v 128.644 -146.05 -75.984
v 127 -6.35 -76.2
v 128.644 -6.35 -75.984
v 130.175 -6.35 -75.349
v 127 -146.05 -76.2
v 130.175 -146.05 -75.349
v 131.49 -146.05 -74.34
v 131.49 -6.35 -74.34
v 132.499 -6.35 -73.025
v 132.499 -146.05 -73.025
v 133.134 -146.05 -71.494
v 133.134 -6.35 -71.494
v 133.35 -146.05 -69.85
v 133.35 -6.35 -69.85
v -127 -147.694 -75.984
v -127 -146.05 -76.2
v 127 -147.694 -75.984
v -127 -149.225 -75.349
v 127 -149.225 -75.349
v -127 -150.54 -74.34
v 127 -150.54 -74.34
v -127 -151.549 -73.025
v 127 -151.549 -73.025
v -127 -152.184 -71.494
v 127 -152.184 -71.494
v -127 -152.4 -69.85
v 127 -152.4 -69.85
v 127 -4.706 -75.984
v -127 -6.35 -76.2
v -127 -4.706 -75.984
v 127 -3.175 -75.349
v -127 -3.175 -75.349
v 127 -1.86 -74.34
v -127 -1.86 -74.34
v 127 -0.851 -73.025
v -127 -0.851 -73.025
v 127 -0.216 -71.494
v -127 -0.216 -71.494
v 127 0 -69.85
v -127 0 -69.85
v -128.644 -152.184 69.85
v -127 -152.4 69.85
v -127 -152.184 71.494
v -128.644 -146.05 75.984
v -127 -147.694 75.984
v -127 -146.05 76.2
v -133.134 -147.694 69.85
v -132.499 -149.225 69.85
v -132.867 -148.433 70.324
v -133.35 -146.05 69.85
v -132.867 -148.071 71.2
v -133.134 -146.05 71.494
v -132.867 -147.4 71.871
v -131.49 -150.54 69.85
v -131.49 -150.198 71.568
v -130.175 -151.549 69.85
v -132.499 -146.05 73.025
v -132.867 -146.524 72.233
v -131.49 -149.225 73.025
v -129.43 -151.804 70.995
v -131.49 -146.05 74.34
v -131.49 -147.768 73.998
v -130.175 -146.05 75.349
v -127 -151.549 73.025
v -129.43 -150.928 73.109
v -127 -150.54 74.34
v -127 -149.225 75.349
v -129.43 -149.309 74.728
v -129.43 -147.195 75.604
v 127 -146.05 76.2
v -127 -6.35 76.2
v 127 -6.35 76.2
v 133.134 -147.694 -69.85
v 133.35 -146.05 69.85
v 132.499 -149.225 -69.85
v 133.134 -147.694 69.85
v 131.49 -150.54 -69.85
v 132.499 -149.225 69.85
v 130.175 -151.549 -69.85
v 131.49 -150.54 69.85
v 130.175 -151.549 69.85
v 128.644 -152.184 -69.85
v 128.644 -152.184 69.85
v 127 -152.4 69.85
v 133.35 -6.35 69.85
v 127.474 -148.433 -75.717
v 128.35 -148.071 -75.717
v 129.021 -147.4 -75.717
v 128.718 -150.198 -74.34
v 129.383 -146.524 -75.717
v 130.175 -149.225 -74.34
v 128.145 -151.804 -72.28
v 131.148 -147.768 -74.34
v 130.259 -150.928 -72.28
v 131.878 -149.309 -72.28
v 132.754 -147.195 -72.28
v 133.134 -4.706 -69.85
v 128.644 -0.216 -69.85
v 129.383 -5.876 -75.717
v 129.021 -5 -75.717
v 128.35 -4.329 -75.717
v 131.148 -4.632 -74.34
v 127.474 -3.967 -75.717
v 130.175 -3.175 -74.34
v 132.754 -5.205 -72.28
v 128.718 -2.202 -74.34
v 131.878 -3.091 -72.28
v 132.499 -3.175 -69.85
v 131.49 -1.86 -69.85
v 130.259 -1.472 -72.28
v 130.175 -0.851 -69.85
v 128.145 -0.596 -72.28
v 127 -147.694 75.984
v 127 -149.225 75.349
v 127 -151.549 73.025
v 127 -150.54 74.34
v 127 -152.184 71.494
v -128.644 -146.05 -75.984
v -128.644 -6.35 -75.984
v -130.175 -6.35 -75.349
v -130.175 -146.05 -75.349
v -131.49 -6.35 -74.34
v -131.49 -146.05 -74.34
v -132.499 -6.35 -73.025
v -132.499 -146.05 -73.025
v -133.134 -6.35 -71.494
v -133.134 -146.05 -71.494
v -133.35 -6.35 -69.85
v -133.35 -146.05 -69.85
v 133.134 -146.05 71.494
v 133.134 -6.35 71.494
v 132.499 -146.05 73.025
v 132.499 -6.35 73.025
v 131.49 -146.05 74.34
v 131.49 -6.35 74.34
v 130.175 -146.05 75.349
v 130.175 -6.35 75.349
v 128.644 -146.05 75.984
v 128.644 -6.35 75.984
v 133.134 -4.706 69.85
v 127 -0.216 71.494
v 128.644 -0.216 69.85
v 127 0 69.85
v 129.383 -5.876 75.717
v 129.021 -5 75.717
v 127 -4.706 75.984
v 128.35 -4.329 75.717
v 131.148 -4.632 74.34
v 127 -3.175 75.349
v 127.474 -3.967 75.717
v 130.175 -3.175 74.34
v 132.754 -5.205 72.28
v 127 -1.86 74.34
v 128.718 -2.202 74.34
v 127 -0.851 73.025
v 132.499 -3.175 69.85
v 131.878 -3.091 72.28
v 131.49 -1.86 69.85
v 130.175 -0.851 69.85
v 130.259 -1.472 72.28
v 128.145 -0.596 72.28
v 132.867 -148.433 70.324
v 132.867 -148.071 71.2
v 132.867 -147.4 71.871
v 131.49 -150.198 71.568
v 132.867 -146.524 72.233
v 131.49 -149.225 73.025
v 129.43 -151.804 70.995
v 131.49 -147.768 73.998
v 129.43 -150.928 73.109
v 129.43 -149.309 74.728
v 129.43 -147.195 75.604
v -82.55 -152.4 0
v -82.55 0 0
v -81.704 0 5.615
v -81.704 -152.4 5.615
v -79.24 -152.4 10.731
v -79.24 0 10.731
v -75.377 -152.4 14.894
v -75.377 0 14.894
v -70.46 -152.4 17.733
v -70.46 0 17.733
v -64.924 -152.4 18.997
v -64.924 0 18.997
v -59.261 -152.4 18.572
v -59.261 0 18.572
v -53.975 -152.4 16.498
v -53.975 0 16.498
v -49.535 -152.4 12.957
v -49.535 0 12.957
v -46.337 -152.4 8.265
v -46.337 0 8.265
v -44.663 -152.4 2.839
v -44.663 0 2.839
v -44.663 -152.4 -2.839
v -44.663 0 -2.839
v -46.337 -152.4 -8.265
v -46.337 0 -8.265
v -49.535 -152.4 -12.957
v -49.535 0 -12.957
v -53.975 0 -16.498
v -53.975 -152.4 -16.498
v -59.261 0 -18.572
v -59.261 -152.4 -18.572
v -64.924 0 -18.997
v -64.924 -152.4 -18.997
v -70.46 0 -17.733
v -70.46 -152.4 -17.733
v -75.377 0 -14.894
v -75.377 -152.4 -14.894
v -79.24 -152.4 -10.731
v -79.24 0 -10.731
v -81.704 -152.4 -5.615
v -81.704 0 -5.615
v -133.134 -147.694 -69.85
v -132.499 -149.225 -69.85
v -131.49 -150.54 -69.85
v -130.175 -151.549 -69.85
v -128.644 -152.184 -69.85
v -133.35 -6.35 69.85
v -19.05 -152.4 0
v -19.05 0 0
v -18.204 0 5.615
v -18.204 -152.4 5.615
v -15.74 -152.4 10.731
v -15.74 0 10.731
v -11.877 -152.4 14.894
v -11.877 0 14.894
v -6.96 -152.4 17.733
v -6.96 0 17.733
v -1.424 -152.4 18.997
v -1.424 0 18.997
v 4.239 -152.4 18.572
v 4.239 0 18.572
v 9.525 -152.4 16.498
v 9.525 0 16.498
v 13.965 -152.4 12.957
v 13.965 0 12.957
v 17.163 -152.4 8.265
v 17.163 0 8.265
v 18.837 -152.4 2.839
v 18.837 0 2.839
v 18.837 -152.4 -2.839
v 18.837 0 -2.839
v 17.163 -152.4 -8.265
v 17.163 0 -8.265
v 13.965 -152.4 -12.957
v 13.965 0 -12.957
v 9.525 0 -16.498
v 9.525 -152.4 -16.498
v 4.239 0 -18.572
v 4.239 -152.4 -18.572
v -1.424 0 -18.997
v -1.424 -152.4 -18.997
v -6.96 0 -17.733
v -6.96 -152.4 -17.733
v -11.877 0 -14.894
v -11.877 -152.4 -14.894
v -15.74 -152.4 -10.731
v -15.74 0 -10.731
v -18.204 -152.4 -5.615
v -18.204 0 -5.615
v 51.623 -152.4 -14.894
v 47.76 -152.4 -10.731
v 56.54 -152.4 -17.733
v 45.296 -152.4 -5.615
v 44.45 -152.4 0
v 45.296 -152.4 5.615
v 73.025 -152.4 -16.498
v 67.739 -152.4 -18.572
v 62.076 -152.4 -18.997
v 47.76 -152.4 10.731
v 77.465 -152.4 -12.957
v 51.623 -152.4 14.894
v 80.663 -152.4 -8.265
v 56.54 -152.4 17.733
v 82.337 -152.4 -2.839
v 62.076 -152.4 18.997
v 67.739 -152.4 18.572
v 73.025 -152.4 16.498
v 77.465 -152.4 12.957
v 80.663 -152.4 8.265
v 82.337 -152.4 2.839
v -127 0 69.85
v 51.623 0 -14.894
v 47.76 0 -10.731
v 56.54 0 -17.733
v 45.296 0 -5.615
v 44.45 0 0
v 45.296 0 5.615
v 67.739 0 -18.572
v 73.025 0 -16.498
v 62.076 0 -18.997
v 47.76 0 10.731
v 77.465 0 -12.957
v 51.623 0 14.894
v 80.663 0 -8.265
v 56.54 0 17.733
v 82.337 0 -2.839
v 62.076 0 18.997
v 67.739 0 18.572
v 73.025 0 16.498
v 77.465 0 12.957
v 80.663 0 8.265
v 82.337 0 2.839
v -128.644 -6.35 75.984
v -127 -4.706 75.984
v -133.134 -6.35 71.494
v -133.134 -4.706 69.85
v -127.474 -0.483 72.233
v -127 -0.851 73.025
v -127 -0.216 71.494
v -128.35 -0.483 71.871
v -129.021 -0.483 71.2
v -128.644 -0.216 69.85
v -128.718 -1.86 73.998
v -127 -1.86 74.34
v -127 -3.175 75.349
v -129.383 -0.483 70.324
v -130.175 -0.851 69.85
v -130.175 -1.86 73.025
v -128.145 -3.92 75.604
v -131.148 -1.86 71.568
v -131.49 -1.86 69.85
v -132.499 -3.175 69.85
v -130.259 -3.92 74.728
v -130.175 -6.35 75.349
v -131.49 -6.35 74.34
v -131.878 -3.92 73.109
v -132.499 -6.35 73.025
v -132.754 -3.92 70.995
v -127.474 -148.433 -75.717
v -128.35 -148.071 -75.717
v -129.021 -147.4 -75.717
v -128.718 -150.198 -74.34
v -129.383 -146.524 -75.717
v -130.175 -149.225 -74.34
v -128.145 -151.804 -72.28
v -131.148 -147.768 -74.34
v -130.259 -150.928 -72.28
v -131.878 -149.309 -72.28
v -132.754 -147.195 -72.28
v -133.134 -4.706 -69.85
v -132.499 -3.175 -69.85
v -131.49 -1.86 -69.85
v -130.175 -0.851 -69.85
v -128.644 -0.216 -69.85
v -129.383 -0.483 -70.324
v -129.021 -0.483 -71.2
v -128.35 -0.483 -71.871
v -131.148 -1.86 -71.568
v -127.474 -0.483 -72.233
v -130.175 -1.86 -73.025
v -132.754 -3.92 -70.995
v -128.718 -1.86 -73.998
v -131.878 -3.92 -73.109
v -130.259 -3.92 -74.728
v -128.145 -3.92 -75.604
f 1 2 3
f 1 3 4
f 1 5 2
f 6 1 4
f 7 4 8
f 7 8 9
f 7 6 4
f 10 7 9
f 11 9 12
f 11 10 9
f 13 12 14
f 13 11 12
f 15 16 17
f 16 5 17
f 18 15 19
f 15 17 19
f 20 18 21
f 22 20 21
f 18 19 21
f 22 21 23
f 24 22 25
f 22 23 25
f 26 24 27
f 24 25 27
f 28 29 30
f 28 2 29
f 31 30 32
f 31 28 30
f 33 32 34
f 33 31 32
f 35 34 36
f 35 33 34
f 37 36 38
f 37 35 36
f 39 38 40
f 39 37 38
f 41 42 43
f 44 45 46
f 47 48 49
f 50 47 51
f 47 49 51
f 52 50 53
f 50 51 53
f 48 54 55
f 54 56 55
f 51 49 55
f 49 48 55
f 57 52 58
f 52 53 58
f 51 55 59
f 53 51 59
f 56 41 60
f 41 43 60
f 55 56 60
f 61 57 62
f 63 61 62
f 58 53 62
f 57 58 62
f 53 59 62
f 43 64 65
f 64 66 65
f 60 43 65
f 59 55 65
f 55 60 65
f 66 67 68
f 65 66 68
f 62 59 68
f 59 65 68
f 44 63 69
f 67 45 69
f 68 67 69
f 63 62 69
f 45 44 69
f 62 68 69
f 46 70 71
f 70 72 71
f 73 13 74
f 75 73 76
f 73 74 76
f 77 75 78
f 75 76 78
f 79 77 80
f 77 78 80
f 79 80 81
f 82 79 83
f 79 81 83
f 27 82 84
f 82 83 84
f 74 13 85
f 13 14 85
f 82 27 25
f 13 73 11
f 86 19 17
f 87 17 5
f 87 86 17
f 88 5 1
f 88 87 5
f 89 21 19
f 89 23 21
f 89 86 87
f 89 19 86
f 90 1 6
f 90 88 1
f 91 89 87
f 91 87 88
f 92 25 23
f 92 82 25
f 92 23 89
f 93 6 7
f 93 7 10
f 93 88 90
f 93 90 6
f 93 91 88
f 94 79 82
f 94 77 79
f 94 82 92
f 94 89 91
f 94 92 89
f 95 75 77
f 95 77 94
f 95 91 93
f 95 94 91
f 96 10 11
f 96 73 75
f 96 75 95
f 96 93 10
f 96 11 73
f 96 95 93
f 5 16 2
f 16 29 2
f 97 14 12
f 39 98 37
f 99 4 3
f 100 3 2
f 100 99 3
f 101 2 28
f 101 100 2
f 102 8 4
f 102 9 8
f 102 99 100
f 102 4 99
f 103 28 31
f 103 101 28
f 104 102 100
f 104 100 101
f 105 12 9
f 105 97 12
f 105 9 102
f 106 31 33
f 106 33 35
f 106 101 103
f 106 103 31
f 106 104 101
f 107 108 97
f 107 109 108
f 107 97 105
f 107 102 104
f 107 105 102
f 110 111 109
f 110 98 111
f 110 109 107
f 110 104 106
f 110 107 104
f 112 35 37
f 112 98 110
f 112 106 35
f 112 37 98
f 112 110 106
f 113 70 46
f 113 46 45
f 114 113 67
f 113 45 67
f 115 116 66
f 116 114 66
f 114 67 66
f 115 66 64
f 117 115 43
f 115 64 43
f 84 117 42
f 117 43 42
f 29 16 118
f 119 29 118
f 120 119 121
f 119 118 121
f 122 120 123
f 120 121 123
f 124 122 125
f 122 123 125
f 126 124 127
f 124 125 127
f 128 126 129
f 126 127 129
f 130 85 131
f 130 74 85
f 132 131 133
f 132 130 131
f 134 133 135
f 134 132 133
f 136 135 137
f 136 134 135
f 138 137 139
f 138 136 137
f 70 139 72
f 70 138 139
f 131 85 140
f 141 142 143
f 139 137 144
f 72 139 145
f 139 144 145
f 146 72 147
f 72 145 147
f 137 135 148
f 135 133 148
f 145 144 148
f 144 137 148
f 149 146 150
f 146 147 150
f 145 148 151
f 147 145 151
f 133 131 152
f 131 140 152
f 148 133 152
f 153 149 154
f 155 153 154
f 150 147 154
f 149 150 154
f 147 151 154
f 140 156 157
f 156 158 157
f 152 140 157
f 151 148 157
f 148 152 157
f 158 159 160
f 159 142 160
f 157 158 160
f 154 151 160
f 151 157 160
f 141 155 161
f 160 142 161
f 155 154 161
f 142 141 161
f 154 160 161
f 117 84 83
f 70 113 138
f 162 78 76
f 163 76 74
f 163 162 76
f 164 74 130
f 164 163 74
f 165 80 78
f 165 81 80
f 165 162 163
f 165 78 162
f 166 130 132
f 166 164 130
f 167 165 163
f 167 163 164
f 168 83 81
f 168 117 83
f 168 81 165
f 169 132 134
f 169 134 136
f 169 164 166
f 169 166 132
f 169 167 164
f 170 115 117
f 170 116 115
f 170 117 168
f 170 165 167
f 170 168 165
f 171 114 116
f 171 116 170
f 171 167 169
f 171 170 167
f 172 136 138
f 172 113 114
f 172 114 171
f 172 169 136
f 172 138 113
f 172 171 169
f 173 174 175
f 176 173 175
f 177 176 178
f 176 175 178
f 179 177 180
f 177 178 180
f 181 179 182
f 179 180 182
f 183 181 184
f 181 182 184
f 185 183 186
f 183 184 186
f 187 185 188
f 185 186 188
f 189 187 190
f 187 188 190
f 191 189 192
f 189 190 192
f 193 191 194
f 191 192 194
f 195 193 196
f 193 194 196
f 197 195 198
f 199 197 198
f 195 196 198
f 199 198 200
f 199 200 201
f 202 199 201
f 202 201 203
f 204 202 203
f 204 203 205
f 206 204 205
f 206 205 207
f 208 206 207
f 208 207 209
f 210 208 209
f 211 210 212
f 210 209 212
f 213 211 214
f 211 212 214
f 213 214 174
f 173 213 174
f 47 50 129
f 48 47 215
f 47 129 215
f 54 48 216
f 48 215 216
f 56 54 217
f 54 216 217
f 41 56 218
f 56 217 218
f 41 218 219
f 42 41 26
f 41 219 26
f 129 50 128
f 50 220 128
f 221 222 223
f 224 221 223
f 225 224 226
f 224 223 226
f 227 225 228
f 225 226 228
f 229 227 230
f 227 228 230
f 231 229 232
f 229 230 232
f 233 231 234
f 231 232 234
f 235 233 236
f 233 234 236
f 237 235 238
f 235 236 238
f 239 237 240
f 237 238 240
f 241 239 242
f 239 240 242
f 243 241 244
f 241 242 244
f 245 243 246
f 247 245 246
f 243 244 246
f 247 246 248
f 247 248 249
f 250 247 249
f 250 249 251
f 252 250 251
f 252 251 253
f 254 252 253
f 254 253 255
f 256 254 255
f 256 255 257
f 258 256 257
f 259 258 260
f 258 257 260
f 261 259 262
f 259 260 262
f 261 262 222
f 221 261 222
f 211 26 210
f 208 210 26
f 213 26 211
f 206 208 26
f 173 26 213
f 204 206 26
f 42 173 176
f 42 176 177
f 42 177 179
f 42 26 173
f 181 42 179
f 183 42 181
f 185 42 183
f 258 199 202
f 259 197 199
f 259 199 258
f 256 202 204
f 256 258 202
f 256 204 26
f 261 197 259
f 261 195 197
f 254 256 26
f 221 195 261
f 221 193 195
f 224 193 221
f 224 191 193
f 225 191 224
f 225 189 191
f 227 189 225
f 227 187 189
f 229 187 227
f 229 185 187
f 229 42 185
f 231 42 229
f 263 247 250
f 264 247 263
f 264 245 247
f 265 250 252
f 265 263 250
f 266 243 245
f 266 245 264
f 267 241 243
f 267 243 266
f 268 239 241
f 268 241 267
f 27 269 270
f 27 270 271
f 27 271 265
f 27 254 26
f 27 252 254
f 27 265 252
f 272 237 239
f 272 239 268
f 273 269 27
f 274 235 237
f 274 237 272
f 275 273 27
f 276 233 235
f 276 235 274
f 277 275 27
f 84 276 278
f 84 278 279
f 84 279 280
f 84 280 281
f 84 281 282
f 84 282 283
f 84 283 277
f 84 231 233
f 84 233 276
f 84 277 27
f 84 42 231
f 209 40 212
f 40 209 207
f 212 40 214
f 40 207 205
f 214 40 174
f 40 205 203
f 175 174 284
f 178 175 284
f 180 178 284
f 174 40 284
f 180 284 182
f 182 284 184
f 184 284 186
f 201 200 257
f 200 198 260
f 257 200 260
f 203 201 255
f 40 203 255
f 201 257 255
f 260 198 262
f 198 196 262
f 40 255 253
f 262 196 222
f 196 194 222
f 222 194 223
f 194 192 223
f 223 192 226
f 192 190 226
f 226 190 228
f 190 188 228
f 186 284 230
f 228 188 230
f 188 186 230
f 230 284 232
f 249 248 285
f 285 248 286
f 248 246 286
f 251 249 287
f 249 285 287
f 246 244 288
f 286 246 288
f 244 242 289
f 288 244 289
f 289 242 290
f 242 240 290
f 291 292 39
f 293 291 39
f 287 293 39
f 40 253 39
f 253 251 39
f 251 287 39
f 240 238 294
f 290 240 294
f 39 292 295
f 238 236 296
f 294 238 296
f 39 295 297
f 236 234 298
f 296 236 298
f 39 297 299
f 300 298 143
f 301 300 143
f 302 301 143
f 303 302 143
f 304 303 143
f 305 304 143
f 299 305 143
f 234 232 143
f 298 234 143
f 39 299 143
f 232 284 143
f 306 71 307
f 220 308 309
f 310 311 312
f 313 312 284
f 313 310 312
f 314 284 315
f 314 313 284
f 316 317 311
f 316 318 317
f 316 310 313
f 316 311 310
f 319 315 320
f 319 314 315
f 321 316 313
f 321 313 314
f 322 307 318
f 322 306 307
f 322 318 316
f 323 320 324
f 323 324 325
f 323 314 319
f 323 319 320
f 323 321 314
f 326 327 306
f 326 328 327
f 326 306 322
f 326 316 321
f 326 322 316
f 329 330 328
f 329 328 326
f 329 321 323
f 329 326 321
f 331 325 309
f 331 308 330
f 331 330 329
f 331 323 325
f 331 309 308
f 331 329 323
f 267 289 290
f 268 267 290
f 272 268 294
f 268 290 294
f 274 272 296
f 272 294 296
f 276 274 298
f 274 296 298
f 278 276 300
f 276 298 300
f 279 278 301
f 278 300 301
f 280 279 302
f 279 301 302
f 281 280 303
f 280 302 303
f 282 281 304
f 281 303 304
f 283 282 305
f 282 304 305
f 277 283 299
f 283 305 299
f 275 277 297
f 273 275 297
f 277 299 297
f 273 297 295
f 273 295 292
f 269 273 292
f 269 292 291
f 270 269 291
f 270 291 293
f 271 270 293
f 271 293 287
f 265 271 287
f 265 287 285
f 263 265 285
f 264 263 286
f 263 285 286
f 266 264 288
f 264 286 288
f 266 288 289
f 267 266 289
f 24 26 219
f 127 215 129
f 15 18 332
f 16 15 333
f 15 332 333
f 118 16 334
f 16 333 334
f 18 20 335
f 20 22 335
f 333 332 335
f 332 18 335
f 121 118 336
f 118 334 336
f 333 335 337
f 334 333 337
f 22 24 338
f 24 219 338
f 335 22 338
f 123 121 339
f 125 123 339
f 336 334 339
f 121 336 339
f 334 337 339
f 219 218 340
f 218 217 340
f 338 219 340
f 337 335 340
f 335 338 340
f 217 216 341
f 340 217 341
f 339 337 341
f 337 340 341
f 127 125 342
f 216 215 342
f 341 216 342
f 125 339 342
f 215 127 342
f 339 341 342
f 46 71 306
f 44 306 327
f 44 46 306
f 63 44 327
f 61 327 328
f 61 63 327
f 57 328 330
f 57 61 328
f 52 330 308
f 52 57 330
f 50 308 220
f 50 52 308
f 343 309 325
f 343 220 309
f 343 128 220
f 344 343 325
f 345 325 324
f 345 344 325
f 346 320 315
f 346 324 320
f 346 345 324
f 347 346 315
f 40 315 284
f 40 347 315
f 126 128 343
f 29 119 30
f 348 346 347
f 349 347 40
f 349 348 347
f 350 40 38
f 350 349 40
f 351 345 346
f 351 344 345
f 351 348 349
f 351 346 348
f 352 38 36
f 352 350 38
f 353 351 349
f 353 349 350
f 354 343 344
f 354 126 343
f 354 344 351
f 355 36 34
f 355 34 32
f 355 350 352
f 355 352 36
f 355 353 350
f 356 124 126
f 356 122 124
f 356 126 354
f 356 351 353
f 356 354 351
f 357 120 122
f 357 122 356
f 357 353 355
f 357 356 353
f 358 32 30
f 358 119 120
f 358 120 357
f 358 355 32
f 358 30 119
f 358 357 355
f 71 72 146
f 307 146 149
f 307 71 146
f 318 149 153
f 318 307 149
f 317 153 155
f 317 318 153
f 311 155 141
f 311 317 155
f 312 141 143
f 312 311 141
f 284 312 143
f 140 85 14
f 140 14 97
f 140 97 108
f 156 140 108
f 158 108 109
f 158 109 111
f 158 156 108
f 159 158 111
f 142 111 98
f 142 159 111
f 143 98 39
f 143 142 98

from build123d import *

# Parameters (mm, degrees)
F1_DEPTH = 152.4
F2_R     = 6.35


with BuildPart() as f1:
    # F0 (on Front) → F1 (new body)
    with BuildSketch(Plane.XZ):
        with BuildLine():
            Line((-133.35, -76.2), (133.35, -76.2))
            Line((133.35, -76.2), (133.35, 0))
            Line((133.35, 0), (82.55, 0))
            ThreePointArc((82.55, 0), (63.5, -19.05), (44.45, 0))
            Line((44.45, 0), (19.05, 0))
            ThreePointArc((19.05, 0), (0, -19.05), (-19.05, 0))
            Line((-19.05, 0), (-44.45, 0))
            ThreePointArc((-44.45, 0), (-63.5, -19.05), (-82.55, 0))
            Line((-82.55, 0), (-133.35, 0))
            Line((-133.35, 0), (-133.35, -76.2))
        make_face()
        with BuildLine():
            Line((82.55, 0), (133.35, 0))
            Line((133.35, 0), (133.35, 76.2))
            Line((133.35, 76.2), (-133.35, 76.2))
            Line((-133.35, 76.2), (-133.35, 0))
            Line((-133.35, 0), (-82.55, 0))
            ThreePointArc((-82.55, 0), (-63.5, 19.05), (-44.45, 0))
            Line((-44.45, 0), (-19.05, 0))
            ThreePointArc((-19.05, 0), (0, 19.05), (19.05, 0))
            Line((19.05, 0), (44.45, 0))
            ThreePointArc((44.45, 0), (63.5, 19.05), (82.55, 0))
        make_face()
    extrude(amount=F1_DEPTH)

    # F2
    f2_edges = [f1.edges().sort_by_distance(p)[0] for p in [
        (0, -152.4, 76.2),
        (133.35, -152.4, 0),
        (-133.35, -152.4, 0),
        (0, -152.4, -76.2),
        (133.35, 0, 0),
        (133.35, -76.2, -76.2),
        (133.35, -76.2, 76.2),
        (-133.35, -76.2, 76.2),
        (0, 0, 76.2),
        (-133.35, -76.2, -76.2),
        (-133.35, 0, 0),
        (0, 0, -76.2),
    ]]
    fillet(f2_edges, radius=F2_R)


solid = f1.part
